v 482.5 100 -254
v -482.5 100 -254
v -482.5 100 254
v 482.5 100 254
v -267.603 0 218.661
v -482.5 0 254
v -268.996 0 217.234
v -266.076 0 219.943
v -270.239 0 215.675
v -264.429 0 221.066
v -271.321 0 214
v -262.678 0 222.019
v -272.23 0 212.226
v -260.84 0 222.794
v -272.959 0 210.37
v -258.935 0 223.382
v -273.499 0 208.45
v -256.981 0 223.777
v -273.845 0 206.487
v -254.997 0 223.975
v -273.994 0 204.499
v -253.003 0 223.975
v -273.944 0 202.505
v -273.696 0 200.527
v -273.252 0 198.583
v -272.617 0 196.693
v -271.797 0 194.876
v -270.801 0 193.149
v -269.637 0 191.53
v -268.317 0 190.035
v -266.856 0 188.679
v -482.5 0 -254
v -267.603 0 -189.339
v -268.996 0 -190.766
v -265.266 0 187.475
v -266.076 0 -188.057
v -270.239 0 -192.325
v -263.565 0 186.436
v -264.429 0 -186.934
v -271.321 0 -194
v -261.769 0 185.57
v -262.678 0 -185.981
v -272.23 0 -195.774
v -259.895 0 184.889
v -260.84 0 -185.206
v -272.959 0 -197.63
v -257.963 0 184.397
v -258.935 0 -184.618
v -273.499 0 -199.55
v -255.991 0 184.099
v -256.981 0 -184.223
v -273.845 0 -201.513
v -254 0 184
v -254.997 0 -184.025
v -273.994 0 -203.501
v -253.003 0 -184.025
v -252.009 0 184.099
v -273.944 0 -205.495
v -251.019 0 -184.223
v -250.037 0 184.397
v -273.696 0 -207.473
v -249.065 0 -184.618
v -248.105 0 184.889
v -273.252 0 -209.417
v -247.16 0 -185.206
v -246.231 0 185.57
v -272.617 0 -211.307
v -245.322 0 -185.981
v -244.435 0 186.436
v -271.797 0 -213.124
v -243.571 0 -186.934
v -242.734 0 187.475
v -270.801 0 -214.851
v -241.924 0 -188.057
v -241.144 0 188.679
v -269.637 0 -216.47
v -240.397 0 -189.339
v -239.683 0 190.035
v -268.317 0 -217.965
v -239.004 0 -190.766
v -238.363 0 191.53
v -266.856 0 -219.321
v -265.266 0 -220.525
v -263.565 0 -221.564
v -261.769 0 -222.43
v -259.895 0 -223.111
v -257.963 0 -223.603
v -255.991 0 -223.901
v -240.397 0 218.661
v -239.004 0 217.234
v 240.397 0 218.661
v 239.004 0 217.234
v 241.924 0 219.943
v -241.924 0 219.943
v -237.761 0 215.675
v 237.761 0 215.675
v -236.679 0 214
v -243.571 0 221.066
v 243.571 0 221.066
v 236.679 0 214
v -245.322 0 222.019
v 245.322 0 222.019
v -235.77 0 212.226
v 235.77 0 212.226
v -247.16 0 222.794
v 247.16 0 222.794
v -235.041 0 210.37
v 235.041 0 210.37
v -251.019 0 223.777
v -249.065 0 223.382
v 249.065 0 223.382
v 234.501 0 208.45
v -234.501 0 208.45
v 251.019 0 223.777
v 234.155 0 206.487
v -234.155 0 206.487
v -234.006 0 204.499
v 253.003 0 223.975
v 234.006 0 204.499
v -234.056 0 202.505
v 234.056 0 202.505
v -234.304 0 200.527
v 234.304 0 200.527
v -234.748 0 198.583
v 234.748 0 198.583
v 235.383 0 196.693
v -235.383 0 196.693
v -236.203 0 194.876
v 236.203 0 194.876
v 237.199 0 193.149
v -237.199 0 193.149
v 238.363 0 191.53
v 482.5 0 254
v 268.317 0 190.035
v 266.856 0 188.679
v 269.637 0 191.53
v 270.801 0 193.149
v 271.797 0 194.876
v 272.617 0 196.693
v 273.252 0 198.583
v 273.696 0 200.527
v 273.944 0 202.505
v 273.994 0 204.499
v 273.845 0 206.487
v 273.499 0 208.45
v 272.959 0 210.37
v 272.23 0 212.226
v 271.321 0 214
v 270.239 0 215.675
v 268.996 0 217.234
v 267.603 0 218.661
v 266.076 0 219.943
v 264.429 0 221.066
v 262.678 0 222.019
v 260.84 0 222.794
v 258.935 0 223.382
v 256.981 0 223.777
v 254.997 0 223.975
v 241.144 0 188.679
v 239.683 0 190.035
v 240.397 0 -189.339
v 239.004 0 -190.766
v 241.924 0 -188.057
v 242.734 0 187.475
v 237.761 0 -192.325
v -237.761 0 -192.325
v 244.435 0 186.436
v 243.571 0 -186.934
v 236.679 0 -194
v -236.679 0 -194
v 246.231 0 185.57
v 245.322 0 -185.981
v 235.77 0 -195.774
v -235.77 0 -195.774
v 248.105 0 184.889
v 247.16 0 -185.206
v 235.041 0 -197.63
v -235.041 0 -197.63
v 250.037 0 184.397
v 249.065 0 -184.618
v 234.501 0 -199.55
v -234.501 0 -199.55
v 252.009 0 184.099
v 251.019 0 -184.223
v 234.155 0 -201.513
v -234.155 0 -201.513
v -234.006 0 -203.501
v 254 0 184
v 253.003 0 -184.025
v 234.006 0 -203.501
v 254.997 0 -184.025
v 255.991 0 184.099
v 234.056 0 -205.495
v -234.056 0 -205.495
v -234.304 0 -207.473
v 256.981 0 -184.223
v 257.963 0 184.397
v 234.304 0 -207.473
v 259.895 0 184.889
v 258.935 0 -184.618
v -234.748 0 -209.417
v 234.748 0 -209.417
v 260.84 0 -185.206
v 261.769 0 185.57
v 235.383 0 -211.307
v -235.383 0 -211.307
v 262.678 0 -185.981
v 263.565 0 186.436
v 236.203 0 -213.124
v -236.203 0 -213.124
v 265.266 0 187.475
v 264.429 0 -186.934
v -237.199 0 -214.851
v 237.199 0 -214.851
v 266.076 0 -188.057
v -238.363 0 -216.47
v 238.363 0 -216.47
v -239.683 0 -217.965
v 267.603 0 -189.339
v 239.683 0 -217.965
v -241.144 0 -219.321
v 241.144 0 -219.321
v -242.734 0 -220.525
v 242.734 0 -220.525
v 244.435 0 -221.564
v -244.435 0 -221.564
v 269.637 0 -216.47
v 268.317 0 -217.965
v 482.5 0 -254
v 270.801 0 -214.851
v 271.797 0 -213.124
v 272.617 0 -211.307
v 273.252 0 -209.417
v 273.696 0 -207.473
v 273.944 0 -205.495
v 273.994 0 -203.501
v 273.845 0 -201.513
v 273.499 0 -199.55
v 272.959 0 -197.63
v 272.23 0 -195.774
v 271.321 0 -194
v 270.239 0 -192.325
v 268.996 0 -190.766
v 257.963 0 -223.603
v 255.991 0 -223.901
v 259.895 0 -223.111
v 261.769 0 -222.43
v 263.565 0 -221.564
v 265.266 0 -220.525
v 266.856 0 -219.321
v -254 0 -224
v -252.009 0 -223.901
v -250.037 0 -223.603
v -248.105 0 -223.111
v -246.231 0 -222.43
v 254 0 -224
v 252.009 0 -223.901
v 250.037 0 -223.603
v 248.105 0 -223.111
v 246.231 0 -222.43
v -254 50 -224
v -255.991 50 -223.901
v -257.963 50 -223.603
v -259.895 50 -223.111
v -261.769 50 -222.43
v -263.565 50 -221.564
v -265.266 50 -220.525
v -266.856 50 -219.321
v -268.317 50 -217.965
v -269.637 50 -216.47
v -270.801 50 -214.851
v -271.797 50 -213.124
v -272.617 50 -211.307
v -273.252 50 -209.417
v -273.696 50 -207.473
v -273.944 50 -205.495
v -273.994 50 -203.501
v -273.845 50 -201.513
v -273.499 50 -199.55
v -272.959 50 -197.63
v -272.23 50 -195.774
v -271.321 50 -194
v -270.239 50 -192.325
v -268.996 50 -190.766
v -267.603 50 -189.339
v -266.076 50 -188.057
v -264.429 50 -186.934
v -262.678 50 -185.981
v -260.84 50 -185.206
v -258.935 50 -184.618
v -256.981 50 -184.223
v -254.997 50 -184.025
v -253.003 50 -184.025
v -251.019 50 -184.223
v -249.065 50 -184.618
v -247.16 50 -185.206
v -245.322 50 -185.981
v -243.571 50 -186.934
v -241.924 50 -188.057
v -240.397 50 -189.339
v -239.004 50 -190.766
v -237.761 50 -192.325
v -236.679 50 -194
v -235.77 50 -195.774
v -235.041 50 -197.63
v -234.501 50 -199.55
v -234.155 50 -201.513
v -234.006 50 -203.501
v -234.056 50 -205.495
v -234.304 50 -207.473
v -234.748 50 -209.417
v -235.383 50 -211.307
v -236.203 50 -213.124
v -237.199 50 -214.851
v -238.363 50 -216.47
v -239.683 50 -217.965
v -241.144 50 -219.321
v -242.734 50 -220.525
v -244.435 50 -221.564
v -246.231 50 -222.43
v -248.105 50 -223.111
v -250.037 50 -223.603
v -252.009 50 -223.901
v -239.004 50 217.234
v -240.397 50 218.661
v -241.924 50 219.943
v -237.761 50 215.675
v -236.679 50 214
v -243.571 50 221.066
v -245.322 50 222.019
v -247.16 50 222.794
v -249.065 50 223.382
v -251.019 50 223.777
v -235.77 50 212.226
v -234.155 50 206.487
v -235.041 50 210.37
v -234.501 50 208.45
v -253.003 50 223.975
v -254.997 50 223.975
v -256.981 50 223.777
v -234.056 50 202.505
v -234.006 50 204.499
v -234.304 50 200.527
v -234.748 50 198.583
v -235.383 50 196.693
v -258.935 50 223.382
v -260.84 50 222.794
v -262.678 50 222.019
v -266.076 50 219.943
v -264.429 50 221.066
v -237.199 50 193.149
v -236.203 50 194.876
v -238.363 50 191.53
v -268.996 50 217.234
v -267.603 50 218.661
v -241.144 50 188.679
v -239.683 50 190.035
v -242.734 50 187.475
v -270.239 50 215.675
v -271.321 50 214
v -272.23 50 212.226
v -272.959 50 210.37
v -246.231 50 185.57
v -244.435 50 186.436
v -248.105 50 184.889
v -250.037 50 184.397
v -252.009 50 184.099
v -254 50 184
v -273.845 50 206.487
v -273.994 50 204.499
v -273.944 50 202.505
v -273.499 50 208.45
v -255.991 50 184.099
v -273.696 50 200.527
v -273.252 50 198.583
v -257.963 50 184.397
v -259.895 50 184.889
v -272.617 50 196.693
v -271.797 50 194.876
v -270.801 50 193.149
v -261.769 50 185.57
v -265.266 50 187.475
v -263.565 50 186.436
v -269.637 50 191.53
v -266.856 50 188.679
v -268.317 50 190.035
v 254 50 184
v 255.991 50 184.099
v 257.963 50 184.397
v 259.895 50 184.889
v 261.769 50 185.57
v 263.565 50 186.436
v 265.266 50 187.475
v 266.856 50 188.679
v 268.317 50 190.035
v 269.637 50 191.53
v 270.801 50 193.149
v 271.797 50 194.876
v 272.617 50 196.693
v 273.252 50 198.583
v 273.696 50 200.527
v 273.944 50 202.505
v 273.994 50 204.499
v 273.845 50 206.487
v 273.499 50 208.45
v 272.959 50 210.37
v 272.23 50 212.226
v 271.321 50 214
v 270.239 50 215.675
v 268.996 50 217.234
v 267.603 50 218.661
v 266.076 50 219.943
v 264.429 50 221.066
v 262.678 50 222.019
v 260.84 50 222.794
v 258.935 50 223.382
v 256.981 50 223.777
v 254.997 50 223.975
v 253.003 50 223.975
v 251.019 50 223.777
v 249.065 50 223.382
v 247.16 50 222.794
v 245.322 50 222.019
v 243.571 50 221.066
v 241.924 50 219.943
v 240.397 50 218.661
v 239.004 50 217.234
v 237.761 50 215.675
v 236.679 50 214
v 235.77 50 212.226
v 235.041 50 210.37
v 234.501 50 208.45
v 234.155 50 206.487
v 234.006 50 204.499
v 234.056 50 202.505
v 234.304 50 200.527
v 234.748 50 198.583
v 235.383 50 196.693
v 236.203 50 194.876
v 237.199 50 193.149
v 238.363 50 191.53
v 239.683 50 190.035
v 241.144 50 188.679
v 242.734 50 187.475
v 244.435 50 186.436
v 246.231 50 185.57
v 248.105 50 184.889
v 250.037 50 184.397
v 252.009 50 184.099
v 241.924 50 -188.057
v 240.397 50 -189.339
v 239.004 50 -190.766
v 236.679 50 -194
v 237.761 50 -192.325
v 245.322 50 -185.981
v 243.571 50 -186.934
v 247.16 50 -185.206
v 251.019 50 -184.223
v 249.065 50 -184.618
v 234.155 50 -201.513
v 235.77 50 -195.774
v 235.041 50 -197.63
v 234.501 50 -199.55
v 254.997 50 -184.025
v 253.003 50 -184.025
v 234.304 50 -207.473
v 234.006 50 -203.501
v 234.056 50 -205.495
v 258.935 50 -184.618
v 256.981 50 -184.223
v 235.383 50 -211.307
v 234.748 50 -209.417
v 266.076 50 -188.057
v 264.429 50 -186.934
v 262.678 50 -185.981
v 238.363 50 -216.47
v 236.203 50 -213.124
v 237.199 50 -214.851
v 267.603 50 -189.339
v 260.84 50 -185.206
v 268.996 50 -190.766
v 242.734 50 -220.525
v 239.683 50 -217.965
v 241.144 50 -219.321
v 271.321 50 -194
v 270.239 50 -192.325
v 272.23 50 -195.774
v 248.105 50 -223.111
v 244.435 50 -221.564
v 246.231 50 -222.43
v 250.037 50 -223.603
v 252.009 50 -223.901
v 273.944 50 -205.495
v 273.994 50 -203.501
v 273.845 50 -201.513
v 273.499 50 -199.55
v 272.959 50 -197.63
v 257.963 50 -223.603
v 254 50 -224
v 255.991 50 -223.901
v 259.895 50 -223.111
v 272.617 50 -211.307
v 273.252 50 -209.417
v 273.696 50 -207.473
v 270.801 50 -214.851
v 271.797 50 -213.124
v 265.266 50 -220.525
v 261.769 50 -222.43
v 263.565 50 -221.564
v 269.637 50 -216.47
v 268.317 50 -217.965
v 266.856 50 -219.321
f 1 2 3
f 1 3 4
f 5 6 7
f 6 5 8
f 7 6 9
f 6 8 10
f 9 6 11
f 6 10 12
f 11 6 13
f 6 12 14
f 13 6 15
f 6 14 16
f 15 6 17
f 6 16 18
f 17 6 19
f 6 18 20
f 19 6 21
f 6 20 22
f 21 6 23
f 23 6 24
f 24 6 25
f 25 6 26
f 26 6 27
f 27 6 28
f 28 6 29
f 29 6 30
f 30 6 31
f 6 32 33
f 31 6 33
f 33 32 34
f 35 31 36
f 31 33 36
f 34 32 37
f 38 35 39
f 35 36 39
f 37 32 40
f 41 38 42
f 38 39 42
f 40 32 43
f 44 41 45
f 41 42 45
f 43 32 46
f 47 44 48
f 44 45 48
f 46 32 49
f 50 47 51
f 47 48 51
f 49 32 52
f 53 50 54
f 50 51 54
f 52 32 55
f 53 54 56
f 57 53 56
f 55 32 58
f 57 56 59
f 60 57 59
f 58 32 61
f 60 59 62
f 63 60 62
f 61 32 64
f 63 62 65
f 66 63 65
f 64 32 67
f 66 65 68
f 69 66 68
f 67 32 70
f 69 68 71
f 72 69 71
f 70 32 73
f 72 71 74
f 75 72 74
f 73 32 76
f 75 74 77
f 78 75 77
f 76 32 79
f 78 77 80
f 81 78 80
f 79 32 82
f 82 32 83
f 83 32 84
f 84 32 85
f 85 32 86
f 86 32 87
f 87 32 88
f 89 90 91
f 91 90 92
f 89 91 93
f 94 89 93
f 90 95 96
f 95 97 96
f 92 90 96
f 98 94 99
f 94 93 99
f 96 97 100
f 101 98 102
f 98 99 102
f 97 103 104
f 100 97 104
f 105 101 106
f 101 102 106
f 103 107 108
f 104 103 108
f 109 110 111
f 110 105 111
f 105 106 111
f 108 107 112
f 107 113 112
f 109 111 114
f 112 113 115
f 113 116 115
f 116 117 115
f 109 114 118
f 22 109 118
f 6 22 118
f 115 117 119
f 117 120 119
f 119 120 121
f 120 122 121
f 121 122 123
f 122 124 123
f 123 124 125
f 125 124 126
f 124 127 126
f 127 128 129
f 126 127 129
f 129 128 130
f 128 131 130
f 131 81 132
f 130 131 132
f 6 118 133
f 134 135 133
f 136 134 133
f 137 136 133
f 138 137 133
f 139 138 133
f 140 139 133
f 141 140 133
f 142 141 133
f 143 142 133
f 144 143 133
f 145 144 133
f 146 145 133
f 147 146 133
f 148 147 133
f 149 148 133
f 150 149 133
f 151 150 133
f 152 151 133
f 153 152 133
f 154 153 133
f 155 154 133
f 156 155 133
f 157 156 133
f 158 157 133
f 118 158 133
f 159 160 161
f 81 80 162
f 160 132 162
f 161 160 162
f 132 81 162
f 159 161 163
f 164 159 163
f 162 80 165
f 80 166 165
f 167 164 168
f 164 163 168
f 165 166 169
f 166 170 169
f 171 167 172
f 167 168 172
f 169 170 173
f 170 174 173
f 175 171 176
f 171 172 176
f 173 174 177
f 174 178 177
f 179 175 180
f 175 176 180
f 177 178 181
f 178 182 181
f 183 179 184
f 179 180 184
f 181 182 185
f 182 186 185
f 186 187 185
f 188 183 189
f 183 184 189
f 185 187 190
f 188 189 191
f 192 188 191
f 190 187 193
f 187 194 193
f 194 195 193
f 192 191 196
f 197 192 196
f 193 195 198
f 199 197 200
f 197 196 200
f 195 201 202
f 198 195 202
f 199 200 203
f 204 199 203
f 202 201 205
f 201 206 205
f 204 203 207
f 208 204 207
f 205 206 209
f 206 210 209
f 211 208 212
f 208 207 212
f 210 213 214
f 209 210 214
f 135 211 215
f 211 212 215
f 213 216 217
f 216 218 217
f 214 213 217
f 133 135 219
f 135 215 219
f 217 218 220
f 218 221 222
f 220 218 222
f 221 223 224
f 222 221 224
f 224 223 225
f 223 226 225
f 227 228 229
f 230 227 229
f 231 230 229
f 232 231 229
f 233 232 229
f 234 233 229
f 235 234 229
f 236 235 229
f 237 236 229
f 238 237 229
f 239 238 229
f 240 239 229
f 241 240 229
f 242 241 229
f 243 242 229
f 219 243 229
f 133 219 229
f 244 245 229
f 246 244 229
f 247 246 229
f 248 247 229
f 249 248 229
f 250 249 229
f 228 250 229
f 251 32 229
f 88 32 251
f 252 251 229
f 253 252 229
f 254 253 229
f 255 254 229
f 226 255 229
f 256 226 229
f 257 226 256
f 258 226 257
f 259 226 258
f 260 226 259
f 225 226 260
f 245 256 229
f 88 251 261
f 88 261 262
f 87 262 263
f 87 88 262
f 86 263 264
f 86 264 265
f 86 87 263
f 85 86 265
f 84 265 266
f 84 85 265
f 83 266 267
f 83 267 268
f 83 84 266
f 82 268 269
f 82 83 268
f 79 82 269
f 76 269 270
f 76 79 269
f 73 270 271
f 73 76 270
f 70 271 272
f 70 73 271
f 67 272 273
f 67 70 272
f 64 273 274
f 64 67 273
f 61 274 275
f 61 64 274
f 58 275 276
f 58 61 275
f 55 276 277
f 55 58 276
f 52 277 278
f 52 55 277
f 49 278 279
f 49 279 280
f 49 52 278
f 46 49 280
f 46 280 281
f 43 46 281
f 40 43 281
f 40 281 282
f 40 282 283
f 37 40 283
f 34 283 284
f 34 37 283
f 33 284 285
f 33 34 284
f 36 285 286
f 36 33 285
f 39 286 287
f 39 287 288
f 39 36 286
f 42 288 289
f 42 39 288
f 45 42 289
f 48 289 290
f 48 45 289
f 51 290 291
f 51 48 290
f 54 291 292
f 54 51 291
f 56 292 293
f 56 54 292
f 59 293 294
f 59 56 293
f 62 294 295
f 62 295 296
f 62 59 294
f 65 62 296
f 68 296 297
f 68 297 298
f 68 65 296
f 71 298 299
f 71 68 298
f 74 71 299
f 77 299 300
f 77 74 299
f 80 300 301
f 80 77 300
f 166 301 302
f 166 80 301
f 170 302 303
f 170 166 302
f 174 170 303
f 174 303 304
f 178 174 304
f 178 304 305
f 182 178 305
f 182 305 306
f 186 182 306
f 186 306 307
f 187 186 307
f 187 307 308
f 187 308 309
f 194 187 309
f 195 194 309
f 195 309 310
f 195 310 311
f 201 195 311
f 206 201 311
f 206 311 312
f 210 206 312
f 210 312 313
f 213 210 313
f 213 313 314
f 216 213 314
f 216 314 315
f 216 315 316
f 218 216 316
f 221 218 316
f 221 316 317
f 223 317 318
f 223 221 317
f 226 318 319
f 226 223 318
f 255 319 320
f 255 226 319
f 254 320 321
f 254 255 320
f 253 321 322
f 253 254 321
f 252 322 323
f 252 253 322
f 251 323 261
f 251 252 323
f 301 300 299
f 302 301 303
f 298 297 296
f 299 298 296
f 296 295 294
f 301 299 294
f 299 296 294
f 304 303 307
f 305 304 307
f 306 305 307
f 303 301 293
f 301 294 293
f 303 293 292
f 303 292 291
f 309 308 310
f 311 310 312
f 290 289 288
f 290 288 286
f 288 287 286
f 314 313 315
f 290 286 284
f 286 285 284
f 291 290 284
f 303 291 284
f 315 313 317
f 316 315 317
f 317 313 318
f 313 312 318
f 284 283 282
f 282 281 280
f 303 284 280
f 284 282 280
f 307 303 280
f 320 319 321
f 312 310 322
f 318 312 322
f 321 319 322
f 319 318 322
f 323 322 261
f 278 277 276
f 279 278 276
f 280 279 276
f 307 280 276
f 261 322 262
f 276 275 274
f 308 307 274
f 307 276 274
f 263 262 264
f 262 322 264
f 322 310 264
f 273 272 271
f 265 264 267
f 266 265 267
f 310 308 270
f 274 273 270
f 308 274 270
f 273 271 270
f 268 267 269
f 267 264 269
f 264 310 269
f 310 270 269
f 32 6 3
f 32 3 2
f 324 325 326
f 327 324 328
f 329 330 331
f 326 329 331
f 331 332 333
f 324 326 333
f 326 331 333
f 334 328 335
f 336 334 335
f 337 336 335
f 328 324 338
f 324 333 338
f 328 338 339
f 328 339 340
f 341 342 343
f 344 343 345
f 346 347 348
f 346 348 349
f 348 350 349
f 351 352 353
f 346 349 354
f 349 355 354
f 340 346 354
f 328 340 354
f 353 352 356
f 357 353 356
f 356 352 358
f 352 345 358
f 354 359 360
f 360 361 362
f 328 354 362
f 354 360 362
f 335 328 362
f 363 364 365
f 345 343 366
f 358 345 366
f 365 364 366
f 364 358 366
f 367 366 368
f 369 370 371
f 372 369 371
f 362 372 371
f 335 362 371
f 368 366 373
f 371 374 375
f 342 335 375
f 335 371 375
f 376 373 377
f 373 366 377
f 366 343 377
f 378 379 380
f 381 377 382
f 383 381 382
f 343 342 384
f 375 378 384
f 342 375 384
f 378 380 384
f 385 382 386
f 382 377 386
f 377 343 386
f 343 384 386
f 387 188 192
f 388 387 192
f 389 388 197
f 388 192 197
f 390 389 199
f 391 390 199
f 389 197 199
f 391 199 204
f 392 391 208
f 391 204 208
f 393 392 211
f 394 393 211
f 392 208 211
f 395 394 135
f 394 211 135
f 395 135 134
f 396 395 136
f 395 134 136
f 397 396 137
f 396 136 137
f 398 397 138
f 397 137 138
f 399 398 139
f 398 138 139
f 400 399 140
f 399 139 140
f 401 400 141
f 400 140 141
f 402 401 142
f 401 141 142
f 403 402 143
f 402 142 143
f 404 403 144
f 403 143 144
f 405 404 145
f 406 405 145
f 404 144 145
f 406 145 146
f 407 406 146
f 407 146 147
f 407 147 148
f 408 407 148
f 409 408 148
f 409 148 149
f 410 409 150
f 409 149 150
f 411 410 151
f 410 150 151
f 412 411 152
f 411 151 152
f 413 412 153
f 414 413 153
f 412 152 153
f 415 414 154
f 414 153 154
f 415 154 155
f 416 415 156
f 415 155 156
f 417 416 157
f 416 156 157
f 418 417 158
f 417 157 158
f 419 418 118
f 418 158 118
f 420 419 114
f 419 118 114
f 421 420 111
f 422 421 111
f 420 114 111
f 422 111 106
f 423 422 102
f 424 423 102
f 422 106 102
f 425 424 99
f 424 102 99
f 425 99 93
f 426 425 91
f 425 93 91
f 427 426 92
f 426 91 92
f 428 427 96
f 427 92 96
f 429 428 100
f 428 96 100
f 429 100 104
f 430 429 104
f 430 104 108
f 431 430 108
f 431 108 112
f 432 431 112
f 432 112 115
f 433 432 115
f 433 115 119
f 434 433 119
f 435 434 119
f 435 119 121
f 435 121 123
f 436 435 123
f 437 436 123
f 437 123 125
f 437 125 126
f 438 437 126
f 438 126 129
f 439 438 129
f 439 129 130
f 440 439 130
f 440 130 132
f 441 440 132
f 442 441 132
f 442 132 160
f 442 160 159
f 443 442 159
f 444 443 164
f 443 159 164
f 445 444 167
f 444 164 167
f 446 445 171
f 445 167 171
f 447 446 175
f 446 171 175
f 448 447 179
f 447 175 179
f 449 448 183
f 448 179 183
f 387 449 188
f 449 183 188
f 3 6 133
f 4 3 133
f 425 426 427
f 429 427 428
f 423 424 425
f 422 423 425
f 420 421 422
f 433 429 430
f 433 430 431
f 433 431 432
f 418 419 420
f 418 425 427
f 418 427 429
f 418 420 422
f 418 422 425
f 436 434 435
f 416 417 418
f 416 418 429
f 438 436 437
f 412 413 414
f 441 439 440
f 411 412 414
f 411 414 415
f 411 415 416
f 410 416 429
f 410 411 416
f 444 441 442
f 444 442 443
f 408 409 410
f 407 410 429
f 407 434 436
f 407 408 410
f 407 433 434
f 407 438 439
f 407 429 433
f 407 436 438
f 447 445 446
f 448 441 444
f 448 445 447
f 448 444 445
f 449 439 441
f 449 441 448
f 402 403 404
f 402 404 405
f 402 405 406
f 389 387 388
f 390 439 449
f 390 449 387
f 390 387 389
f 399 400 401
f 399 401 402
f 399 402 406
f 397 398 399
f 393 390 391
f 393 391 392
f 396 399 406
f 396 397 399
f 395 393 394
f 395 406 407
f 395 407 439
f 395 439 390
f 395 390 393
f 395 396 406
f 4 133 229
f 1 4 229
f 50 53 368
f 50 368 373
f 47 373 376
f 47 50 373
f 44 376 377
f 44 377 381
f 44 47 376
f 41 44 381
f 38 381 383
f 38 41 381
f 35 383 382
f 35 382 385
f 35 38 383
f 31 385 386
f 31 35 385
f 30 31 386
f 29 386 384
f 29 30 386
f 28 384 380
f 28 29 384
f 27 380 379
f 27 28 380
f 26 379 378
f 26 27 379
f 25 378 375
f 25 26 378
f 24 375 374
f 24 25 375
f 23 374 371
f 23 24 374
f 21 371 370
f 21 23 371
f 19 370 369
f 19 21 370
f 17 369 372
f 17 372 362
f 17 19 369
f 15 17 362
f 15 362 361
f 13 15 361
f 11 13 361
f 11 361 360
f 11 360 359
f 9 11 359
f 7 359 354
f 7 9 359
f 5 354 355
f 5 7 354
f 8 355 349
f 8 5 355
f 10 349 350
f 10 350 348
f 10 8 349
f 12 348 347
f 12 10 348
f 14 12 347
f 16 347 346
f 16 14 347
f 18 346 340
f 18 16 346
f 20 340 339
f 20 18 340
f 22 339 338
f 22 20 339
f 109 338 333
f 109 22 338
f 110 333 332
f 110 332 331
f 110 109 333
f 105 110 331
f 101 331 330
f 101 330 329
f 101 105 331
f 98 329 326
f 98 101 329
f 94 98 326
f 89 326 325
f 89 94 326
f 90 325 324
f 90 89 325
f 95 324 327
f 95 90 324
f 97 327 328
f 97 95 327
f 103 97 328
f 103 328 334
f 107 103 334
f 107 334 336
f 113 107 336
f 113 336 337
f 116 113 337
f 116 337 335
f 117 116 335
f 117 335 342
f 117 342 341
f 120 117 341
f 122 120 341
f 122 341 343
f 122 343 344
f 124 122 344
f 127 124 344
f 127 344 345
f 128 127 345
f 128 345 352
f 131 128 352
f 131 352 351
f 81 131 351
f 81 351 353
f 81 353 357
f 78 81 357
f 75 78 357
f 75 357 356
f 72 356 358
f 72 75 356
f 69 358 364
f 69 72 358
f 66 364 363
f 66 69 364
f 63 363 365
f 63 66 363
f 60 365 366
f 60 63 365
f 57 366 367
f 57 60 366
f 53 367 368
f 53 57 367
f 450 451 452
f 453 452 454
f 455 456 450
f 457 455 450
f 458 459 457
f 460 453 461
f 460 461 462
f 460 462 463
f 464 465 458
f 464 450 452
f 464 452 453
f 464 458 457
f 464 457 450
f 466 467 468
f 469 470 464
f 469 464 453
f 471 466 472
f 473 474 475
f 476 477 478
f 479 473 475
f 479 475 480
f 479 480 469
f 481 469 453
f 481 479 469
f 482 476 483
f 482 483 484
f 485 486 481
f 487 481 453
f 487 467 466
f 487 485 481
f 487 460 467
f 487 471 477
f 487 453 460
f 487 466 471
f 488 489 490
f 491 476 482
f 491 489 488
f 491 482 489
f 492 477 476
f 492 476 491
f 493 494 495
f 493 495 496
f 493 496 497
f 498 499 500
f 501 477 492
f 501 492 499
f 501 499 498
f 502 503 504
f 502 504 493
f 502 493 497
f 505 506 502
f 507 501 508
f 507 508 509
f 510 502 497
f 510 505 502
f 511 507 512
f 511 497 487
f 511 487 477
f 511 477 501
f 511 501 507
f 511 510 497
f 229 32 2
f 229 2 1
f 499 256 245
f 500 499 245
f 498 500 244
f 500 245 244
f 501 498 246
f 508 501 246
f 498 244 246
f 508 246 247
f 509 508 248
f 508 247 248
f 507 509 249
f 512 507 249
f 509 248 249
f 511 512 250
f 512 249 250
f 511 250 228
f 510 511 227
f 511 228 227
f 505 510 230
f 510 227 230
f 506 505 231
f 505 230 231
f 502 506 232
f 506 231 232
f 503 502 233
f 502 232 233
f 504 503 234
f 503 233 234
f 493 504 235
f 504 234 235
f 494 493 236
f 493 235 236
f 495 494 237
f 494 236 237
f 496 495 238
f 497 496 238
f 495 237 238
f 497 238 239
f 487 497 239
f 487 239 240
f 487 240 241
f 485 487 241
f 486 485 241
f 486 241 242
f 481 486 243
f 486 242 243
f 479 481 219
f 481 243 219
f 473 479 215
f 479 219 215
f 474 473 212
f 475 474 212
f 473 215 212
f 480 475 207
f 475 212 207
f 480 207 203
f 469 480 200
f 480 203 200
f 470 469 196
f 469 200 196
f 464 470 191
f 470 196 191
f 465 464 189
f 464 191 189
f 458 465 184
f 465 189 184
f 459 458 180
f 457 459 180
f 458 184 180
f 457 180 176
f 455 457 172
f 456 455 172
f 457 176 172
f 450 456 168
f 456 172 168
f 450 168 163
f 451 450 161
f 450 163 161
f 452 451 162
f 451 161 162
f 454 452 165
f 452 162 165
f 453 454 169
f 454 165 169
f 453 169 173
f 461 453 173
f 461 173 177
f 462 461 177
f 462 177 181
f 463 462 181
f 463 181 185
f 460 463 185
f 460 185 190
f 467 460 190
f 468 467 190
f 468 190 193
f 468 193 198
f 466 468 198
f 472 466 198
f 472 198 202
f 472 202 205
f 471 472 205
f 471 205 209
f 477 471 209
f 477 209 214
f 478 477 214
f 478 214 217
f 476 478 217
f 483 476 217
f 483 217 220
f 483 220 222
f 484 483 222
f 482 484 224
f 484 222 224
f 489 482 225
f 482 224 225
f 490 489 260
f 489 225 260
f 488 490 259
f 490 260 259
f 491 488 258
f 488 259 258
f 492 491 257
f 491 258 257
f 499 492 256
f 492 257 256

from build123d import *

# Parameters (mm, degrees)
SKETCH1_W           = 965
SKETCH1_H           = 508
BOSS_EXTRUDE1_DEPTH = 100
SKETCH5_R           = 20
CUT_EXTRUDE1_DEPTH  = 50


with BuildPart() as part:
    # Sketch1 → Boss-Extrude1 (new body)
    with BuildSketch(Plane(origin=(0, 0, 0), x_dir=(1, 0, 0), z_dir=(0, 1, 0))):
        Rectangle(SKETCH1_W, SKETCH1_H)
    extrude(amount=BOSS_EXTRUDE1_DEPTH)

    # Sketch5 → Cut-Extrude1 (cut)
    with BuildSketch(Plane.XZ):
        with Locations(Location((254, 204, 0), (0, 0, 270))):
            Circle(SKETCH5_R)
        with Locations(Location((254, -204, 0), (0, 0, 270))):
            Circle(SKETCH5_R)
    cut_extrude1 = extrude(amount=-CUT_EXTRUDE1_DEPTH, mode=Mode.SUBTRACT)

    # Mirror1: Cut-Extrude1 across plane
    add(cut_extrude1.mirror(Plane(origin=(0, 0, 0), x_dir=(0, 0, 1), z_dir=(1, 0, 0))), mode=Mode.SUBTRACT)


solid = part.part
